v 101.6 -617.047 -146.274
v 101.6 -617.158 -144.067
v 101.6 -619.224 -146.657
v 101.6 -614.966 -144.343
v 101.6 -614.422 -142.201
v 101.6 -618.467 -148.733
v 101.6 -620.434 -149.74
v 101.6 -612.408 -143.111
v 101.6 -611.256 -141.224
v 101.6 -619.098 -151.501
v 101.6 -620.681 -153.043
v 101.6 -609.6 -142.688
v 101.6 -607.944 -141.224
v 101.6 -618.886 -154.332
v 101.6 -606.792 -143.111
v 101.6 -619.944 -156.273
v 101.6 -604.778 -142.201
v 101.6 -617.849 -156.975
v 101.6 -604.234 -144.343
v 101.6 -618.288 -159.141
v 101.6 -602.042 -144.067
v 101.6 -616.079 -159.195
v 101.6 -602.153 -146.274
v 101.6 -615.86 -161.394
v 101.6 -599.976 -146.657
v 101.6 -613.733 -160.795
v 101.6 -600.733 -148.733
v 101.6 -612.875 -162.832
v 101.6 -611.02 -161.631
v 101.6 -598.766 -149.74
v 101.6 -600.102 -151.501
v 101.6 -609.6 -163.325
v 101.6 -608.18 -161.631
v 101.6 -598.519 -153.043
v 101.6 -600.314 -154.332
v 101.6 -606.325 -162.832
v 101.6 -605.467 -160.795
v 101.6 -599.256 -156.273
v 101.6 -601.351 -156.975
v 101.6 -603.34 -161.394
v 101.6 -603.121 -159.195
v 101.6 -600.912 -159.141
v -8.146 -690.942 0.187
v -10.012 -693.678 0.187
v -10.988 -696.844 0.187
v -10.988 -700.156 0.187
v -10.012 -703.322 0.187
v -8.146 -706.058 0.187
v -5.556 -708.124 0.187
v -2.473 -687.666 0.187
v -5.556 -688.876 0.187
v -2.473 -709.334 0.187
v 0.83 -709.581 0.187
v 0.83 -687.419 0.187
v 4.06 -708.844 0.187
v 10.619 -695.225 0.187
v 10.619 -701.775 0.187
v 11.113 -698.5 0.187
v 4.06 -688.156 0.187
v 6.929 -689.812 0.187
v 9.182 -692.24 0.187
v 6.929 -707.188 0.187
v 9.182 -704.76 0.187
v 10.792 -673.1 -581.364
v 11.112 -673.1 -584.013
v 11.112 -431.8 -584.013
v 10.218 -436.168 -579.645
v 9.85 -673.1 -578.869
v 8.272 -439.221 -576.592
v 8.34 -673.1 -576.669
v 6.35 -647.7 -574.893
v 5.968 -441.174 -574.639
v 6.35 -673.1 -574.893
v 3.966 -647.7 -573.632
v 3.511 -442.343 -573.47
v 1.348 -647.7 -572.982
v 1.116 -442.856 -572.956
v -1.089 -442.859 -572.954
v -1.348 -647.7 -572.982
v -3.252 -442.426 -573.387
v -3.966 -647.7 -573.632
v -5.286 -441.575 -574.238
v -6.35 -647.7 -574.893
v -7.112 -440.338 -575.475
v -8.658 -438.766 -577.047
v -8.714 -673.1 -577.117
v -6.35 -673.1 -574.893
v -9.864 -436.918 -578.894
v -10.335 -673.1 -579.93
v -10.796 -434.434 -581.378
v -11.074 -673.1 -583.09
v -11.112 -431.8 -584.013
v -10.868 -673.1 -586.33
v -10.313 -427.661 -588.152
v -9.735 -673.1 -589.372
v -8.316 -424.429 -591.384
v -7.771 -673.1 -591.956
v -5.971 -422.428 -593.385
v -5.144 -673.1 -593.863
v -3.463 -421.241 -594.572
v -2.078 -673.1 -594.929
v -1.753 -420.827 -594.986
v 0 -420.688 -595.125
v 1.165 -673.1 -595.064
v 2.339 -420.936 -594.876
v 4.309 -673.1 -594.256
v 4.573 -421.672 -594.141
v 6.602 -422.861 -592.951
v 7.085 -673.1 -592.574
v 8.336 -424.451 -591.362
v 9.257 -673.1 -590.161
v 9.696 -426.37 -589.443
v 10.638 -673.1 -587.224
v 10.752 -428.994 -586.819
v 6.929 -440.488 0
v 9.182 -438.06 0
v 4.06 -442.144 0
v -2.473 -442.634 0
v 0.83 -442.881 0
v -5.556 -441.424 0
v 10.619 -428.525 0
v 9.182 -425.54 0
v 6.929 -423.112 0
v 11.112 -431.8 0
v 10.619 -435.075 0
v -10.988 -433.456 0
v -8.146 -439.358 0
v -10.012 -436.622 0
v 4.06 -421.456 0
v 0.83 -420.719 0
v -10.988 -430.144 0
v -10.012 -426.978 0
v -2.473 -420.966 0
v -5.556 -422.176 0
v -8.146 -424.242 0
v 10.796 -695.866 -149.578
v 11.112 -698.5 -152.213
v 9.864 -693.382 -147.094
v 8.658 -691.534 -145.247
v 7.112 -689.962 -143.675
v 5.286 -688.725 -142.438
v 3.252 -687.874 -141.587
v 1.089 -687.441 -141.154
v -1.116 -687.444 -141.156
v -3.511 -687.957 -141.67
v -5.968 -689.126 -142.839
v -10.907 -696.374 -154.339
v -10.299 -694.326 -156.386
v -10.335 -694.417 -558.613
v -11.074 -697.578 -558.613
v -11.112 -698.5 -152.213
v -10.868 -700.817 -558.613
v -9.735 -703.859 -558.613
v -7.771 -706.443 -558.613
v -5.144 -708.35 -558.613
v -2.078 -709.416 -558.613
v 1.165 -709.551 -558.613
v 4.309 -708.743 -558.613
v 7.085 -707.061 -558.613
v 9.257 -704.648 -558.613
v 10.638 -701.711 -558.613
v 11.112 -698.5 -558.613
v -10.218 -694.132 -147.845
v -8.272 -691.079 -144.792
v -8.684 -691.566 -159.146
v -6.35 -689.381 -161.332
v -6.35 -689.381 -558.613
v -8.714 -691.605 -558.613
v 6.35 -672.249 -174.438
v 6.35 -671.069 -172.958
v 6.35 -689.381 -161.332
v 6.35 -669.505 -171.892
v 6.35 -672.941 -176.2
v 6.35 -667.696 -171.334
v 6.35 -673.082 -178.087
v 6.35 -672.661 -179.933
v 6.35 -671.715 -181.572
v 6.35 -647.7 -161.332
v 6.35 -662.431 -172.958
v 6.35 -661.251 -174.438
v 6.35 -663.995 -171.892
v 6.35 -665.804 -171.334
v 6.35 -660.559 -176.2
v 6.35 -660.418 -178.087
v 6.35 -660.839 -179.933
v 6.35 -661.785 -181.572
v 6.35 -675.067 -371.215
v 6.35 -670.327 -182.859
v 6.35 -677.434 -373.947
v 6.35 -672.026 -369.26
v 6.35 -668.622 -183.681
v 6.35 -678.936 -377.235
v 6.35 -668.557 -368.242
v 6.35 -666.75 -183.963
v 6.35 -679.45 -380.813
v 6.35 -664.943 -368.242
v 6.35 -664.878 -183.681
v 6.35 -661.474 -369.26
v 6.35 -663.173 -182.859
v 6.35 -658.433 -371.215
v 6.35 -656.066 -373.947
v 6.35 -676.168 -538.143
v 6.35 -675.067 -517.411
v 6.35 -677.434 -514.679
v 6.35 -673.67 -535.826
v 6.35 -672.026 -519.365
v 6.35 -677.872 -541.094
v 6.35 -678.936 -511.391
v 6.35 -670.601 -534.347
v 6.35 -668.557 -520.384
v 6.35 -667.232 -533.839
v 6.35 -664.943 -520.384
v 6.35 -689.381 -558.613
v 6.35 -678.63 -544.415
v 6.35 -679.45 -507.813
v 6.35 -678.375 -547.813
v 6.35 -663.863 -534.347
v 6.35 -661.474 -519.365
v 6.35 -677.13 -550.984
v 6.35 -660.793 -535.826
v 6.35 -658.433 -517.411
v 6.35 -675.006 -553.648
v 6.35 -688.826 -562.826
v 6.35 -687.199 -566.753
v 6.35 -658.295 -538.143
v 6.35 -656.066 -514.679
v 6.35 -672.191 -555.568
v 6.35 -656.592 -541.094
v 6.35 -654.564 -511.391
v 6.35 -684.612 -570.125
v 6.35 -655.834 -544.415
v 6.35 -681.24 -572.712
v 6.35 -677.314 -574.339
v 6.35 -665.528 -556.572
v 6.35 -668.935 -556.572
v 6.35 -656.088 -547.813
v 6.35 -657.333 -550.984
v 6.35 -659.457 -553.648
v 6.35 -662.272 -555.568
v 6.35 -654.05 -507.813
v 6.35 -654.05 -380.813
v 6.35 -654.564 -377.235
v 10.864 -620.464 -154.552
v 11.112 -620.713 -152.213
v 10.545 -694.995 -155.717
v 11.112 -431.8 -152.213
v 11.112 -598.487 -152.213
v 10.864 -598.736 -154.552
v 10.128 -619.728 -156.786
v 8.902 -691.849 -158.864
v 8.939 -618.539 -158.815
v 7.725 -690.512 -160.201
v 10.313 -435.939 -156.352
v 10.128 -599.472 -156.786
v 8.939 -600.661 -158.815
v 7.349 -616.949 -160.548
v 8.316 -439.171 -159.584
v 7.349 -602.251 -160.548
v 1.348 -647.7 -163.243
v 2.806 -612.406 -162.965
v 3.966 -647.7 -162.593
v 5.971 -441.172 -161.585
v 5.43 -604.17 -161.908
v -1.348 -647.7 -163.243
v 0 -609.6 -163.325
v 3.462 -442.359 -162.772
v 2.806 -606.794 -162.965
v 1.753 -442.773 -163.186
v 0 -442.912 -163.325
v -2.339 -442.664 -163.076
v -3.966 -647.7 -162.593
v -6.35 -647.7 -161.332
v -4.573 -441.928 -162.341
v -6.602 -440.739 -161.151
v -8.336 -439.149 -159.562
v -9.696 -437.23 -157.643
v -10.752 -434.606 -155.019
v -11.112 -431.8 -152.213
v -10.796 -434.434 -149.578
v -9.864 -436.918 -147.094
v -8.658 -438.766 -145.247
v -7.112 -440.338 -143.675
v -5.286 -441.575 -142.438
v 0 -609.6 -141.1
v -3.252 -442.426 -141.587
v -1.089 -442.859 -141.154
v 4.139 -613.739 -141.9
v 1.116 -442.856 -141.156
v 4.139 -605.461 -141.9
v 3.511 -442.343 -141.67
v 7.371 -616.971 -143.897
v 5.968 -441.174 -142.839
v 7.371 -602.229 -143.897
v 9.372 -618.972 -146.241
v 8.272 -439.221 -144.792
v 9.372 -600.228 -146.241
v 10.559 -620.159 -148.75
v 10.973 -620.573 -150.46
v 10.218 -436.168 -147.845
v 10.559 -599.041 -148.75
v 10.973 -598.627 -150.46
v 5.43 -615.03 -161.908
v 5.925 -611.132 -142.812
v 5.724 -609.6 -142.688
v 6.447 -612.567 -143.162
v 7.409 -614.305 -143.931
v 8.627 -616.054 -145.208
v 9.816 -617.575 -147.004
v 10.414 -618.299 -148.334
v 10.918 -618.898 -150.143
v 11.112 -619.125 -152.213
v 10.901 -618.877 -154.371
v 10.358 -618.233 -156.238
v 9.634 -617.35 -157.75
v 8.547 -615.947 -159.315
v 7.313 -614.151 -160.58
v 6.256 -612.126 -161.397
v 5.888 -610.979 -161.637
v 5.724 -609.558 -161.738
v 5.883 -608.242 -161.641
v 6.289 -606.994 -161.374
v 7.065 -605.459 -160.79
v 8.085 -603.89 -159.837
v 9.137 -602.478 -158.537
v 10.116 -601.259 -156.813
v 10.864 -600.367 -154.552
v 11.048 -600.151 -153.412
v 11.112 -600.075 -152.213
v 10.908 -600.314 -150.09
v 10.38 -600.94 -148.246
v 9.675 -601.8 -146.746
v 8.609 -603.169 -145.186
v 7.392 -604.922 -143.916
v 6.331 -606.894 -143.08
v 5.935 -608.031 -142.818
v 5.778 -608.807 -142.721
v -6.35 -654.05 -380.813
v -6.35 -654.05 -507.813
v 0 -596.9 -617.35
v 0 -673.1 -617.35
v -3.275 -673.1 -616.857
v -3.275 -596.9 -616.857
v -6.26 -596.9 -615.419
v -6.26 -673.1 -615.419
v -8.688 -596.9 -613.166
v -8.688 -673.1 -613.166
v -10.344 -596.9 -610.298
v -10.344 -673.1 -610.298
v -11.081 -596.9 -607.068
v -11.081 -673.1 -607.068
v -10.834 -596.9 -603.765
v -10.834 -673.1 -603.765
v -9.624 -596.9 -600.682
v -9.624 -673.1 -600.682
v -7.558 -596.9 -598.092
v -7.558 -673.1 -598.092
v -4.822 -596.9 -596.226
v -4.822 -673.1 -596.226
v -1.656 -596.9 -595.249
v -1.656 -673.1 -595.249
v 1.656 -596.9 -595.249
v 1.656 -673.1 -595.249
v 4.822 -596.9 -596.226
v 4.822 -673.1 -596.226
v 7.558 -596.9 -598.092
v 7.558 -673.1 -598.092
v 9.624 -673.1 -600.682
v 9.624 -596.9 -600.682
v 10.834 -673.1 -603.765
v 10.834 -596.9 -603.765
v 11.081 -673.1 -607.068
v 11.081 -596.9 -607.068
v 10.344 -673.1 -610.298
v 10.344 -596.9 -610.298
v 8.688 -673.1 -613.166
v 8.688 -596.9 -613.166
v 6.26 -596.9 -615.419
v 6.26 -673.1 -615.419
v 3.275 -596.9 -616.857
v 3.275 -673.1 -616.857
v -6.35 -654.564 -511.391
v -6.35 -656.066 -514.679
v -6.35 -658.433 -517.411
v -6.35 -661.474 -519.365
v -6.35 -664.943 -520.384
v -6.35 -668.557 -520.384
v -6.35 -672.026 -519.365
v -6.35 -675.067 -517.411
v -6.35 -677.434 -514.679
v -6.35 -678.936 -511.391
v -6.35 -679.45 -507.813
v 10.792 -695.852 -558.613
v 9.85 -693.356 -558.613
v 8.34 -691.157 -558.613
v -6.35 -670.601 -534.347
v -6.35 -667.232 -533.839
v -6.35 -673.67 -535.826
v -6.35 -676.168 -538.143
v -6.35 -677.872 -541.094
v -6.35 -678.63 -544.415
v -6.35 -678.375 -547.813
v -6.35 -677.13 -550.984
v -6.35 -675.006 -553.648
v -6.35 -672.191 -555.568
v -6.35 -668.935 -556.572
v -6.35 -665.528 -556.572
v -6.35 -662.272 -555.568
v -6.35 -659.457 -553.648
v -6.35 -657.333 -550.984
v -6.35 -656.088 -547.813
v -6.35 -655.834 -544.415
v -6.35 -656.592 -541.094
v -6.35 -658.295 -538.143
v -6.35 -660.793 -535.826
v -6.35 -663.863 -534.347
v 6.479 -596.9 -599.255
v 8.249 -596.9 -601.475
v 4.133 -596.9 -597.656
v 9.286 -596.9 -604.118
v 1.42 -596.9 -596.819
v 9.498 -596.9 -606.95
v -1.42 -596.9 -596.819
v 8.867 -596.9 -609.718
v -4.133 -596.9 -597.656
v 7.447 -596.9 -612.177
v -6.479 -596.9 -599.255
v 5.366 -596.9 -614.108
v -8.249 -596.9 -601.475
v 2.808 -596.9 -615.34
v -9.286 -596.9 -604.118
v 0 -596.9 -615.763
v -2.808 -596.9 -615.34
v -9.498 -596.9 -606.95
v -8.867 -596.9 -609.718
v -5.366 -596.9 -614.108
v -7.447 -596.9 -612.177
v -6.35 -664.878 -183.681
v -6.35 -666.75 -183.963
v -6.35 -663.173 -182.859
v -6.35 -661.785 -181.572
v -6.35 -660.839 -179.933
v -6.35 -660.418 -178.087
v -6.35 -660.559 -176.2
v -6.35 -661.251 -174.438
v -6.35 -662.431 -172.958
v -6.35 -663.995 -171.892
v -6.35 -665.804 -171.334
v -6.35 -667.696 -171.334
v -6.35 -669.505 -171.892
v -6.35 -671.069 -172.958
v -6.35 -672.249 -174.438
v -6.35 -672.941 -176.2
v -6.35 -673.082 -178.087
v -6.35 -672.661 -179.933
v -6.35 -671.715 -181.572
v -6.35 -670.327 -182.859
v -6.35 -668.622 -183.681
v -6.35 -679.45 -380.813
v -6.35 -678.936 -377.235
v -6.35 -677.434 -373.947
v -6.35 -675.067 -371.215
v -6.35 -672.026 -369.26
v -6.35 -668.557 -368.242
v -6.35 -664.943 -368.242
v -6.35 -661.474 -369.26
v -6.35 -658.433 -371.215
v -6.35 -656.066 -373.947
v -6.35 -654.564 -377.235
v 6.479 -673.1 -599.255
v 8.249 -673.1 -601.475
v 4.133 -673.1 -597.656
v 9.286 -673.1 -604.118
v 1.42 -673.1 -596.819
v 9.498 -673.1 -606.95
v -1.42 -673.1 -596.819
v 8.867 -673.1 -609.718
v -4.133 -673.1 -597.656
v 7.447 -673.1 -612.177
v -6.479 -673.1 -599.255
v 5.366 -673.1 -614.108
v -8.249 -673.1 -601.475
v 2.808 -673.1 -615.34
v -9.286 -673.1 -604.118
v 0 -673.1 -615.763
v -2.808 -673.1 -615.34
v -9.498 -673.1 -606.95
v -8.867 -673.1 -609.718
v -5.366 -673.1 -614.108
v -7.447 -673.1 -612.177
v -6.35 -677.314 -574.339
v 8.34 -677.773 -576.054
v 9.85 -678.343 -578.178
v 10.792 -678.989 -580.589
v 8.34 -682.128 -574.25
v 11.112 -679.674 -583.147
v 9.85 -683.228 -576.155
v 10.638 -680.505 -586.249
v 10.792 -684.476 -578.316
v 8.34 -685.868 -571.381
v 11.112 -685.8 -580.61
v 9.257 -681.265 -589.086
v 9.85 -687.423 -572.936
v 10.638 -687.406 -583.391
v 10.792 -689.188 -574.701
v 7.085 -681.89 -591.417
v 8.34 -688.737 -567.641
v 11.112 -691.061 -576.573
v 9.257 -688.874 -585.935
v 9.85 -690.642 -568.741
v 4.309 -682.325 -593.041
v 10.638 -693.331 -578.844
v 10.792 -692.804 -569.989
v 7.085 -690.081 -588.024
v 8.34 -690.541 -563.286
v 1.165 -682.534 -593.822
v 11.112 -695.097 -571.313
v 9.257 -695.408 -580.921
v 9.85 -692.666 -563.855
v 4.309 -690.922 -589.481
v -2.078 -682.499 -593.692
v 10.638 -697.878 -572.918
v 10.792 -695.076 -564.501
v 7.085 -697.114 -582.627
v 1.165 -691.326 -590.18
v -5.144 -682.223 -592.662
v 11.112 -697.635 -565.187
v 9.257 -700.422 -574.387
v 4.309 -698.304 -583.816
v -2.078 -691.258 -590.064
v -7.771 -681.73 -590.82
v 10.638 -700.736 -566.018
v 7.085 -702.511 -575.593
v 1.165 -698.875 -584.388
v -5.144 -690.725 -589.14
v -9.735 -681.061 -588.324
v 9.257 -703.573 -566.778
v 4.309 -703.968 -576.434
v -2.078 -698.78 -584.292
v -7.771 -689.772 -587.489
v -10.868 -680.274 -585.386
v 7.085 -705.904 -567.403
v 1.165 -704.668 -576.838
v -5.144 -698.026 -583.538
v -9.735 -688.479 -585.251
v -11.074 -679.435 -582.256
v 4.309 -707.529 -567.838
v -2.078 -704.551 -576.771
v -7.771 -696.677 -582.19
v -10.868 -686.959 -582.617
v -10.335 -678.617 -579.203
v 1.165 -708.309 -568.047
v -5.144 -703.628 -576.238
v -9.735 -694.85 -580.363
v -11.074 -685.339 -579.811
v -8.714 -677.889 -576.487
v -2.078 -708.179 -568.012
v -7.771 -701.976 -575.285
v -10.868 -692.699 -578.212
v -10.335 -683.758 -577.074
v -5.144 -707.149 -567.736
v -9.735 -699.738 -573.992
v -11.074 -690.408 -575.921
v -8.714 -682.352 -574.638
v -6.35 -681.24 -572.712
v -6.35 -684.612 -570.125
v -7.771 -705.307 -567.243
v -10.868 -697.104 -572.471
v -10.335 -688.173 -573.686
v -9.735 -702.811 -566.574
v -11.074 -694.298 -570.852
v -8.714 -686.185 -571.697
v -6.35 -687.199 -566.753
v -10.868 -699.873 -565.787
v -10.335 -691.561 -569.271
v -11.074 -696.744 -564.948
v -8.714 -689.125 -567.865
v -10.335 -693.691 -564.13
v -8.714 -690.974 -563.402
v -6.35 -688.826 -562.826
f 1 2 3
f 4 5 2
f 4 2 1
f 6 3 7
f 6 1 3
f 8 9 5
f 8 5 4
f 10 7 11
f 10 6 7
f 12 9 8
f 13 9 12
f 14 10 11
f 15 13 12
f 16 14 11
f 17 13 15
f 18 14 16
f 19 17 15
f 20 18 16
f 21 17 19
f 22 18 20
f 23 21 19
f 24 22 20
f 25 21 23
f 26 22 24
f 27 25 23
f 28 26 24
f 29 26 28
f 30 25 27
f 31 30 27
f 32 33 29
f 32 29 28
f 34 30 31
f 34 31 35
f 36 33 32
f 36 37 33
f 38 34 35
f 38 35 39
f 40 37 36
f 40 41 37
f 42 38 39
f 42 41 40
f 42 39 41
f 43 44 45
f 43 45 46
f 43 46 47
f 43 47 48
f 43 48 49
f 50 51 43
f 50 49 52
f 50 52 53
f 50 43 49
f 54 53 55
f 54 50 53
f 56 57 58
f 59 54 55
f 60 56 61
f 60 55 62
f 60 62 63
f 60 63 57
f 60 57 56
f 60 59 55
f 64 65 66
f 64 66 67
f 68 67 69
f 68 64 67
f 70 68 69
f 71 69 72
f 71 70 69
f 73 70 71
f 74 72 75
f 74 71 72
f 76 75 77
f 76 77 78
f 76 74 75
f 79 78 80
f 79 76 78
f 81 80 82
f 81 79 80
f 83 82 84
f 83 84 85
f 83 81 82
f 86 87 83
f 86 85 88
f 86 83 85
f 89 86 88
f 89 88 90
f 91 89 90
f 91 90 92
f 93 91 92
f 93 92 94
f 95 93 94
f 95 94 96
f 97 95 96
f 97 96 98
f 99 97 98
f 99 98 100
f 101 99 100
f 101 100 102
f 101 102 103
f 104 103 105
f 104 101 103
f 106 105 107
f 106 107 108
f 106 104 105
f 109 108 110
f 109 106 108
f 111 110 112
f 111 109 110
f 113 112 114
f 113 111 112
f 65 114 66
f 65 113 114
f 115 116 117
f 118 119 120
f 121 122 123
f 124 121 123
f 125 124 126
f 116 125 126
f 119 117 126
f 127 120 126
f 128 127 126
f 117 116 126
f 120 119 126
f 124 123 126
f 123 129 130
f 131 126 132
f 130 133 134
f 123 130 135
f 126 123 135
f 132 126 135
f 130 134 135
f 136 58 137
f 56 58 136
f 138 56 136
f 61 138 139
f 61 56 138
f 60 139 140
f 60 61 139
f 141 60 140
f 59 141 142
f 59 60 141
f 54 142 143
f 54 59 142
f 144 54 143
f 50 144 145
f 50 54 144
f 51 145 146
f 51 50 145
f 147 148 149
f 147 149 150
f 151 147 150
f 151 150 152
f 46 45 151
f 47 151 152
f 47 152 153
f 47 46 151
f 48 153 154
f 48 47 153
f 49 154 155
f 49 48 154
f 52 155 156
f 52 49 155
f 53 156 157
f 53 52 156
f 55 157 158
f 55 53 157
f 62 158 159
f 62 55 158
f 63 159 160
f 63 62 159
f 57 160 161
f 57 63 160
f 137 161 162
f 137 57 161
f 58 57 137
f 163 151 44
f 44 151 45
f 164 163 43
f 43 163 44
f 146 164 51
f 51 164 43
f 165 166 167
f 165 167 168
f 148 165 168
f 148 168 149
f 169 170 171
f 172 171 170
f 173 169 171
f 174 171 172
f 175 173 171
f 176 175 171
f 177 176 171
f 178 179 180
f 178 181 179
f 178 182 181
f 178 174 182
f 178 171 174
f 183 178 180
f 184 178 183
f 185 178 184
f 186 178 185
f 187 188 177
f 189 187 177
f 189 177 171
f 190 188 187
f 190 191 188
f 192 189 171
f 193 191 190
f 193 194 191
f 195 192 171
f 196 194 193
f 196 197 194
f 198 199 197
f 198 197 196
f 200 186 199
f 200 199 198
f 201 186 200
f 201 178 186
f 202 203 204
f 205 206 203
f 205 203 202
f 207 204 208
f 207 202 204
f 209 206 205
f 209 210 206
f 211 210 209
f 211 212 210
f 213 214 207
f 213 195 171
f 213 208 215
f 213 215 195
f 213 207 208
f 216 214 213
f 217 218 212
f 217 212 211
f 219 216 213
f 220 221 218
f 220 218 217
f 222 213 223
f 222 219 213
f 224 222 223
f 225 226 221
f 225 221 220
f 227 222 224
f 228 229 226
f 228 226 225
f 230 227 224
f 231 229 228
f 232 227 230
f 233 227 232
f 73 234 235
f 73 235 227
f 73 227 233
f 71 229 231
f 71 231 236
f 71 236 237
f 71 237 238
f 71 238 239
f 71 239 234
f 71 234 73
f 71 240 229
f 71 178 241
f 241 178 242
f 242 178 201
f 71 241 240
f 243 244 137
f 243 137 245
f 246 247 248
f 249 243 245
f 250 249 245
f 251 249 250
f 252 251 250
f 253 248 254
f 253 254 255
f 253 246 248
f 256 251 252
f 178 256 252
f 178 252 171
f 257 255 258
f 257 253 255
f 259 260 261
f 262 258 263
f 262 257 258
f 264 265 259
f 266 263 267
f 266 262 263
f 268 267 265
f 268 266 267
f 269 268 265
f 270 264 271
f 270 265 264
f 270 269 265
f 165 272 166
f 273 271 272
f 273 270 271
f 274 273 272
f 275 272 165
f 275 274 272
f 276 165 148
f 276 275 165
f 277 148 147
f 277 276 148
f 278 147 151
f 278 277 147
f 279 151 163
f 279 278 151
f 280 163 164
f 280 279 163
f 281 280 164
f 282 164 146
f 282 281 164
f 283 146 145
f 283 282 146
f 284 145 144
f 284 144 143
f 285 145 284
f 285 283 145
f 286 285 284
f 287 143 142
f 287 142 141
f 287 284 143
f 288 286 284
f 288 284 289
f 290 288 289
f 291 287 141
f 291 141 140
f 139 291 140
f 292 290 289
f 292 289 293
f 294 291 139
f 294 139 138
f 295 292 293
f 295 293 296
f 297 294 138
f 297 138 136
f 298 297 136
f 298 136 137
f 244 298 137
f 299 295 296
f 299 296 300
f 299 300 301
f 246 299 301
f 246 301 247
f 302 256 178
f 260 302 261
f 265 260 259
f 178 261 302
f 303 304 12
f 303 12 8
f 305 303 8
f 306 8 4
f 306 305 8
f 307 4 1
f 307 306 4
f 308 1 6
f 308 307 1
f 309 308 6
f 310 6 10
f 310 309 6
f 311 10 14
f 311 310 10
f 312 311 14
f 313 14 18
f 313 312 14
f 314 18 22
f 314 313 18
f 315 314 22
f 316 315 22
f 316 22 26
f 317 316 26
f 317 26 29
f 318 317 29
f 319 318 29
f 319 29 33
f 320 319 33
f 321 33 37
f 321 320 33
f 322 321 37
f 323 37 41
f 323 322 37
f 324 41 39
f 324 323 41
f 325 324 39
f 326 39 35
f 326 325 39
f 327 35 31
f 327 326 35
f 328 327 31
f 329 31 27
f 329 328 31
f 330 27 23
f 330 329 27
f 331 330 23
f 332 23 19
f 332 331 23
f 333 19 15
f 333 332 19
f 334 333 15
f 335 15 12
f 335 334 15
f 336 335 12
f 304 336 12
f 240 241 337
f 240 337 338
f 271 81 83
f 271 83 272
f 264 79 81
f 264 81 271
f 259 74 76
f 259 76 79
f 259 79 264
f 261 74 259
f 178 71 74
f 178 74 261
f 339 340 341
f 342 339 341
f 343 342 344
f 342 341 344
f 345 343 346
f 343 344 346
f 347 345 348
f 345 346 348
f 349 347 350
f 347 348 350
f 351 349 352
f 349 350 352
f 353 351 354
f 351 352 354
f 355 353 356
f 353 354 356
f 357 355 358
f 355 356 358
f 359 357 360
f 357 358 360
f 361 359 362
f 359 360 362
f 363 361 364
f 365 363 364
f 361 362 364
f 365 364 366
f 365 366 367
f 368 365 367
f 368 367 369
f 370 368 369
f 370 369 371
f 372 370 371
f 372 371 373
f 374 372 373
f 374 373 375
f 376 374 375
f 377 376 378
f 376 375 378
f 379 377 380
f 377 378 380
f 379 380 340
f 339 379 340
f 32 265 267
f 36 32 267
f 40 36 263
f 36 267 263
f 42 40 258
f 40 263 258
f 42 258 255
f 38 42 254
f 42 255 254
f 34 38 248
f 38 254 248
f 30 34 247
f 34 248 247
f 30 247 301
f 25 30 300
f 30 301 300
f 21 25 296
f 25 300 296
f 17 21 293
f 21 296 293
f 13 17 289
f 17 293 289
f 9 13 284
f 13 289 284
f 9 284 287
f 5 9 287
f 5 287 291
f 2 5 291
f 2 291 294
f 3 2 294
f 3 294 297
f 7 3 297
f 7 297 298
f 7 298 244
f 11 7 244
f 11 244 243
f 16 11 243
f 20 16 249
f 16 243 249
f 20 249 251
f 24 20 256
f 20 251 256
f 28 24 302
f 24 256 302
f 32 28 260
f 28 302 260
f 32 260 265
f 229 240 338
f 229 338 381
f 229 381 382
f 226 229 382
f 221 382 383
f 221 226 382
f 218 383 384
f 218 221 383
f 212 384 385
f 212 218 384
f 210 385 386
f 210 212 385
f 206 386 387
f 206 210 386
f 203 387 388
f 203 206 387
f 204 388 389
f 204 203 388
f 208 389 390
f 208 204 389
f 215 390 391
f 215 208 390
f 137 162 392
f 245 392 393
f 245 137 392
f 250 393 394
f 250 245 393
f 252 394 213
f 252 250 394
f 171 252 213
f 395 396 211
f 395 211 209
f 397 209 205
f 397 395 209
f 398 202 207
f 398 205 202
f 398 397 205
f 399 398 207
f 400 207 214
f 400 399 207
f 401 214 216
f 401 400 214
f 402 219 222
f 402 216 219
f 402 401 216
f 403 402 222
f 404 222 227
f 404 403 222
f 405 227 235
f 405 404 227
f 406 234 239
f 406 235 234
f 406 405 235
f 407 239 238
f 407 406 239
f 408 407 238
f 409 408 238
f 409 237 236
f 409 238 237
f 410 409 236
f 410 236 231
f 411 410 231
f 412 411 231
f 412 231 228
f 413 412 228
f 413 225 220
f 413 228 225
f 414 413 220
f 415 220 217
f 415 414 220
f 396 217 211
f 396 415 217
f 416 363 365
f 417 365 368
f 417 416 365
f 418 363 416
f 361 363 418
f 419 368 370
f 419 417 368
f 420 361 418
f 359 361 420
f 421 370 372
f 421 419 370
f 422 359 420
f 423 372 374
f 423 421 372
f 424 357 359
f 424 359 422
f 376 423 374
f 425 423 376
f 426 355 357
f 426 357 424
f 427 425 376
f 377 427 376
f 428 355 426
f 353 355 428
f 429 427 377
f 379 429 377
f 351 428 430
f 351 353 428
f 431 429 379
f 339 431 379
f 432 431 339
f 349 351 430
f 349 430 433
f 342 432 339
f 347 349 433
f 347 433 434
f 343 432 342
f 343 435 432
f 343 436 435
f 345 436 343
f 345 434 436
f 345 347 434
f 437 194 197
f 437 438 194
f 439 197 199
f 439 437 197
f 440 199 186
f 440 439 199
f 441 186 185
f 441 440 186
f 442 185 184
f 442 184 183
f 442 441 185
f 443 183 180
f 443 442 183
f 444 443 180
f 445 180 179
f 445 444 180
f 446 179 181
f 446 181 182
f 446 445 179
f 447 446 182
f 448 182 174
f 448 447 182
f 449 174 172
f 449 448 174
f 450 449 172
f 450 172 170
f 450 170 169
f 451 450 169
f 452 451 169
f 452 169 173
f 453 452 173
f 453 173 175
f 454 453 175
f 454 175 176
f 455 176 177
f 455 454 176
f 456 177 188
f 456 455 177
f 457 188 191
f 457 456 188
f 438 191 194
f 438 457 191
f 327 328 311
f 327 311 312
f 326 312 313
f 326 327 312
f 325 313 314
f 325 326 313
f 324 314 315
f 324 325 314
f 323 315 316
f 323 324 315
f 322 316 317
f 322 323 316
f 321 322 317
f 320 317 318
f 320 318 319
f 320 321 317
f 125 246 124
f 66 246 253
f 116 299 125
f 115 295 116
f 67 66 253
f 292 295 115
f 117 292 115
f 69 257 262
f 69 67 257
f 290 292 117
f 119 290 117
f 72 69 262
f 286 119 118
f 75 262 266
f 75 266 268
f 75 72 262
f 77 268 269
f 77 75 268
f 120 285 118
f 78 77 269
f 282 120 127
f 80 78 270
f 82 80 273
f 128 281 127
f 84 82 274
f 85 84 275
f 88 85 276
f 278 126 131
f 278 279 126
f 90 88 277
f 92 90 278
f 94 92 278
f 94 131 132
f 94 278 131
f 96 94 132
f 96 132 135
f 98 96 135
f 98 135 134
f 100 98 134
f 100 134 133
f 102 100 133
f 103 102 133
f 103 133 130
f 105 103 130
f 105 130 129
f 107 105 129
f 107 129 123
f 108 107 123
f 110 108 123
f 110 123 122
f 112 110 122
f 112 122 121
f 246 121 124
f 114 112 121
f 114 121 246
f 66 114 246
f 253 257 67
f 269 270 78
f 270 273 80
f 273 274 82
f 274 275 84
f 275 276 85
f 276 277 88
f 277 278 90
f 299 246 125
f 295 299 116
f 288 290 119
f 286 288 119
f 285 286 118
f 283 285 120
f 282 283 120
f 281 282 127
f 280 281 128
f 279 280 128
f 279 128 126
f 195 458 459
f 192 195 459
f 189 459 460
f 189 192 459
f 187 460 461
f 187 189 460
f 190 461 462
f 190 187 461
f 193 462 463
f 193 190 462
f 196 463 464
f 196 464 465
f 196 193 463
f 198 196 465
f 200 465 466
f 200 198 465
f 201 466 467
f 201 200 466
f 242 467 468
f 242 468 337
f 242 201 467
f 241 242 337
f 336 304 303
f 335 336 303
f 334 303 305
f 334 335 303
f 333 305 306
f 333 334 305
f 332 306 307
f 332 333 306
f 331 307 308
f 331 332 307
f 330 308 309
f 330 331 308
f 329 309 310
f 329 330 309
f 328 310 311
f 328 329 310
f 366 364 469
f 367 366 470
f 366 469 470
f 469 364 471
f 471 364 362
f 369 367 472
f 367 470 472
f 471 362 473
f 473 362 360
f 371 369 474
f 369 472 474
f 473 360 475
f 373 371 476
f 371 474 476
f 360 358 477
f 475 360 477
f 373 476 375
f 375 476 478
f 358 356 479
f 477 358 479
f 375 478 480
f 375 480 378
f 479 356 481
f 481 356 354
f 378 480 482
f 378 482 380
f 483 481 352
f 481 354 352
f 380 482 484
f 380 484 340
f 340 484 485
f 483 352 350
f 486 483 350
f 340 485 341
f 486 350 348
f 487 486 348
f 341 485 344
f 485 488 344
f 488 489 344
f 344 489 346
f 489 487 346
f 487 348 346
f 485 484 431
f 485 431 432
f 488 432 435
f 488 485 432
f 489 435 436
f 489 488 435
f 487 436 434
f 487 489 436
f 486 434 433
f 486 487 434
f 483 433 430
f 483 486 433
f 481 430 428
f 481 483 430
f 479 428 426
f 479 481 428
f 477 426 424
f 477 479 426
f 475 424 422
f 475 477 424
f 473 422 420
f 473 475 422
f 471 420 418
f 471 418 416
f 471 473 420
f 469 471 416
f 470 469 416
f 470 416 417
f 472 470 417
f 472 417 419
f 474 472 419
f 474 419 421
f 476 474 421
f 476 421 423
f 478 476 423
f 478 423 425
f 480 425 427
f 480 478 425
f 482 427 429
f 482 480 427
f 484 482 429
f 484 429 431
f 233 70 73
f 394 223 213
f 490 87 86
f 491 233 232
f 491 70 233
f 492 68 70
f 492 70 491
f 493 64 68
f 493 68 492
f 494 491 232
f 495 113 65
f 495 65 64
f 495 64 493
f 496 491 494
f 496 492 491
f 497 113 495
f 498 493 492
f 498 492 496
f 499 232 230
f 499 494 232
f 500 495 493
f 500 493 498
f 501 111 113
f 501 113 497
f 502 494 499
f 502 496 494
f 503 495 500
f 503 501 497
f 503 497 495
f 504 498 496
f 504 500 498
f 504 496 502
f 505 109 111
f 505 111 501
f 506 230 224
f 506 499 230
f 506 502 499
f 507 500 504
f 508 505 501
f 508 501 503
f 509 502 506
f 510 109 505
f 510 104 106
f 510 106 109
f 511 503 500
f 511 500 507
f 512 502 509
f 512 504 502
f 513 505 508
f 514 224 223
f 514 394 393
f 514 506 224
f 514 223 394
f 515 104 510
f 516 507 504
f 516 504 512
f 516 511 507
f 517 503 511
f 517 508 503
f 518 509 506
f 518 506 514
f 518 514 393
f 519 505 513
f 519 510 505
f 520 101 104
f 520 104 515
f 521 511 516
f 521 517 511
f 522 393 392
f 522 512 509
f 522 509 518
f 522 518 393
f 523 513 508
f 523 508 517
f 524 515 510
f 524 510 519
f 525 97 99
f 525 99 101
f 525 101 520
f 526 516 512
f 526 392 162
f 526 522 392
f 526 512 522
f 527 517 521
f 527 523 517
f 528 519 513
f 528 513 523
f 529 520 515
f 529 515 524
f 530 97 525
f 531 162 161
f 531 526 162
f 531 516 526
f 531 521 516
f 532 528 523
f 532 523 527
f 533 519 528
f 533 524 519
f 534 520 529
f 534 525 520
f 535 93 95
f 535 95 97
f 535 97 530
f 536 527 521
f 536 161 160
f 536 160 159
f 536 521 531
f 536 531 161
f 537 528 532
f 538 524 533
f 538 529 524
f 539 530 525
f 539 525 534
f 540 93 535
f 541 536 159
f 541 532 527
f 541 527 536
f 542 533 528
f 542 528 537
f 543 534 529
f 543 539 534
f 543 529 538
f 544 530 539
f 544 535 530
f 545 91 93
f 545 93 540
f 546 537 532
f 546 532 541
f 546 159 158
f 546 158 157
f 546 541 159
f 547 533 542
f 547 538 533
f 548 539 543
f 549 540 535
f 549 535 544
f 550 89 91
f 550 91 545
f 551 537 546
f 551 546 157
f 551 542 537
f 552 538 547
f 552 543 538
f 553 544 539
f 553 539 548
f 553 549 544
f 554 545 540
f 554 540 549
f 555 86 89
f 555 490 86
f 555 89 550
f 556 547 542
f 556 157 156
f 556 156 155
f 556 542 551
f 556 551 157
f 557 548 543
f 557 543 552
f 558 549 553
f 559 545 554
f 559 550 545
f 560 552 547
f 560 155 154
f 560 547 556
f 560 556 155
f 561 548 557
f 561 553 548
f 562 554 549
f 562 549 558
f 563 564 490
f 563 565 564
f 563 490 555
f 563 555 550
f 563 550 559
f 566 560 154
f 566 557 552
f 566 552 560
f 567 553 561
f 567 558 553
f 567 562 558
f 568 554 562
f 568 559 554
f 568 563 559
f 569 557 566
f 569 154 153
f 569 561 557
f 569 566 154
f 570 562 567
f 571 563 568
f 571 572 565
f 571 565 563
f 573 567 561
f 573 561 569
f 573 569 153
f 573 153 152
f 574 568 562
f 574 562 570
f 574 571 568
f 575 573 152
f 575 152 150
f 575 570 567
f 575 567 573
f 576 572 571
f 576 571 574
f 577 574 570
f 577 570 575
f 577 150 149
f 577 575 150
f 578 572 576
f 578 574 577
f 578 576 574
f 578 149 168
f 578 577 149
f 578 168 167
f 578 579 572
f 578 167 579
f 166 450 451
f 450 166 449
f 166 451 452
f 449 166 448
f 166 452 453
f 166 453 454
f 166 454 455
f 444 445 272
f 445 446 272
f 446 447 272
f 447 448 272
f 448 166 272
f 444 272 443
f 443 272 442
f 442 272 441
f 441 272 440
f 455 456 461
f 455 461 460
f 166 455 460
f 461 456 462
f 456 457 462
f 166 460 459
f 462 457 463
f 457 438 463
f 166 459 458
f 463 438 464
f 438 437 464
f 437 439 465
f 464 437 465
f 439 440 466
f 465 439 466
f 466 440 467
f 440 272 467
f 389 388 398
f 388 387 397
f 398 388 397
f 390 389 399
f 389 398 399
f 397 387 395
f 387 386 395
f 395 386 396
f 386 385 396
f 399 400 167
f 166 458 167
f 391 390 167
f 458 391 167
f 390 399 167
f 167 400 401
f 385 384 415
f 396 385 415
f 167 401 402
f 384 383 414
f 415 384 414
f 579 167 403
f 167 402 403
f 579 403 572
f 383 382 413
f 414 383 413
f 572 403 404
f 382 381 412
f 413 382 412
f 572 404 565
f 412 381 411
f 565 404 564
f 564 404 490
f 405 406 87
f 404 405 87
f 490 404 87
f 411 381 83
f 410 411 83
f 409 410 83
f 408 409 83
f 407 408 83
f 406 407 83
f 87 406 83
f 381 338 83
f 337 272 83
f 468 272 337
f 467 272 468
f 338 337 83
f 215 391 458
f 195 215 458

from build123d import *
from build123d.topology import SkipClean

# Parameters (mm, degrees)
SKETCH3_R               = 11.1125
SKETCH3_8_R             = 11.1125
SKETCH11_R              = 6.35
BOSS_EXTRUDE2_DEPTH     = 6.35
SKETCH12_R              = 11.1125
SKETCH12_R_2            = 9.525
BOSS_EXTRUDE3_DEPTH     = 101.6
SKETCH13_R              = 11.1125
SKETCH13_R_2            = 9.525
BOSS_EXTRUDE4_DEPTH     = 76.2
CUT_EXTRUDE2_DEPTH      = 947.041134319
CUT_EXTRUDE2_DEPTH_BACK = 947.041134319
SKETCH14_R              = 11.43


with BuildPart() as part:
    # Sweep1: sweep along a path in Sketch1
    with BuildLine(Plane(origin=(0, 0, 0), x_dir=(0, 0, -1), z_dir=(1, 0, 0))) as sweep1_path:
        Line((0, -431.8), (152.212779539, -431.8))
        Line((152.212779539, -431.8), (584.012779539, -431.8))
        Line((584.012779539, -431.8), (584.012779539, -673.1))
        ThreePointArc((584.012779539, -673.1), (576.573291781, -691.060512242), (558.612779539, -698.5))
        Line((558.612779539, -698.5), (152.212779539, -698.5))
        Line((152.212779539, -698.5), (-0.187220461, -698.5))
    # Sketch3 → Sweep1 (sweep)
    with BuildSketch(Plane.XY):
        with Locations((0, -698.5)):
            Circle(SKETCH3_R)
    sweep(path=sweep1_path.line, transition=Transition.RIGHT)

    # Sweep2: sweep along a path in Sketch1<23>
    with BuildLine(Plane(origin=(0, 0, 0), x_dir=(0, 0, -1), z_dir=(1, 0, 0))) as sweep2_path:
        Line((-0.187220461, -698.5), (152.212779539, -698.5))
        Line((152.212779539, -698.5), (152.212779539, -431.8))
    # Sketch3<8> → Sweep2 (sweep)
    with BuildSketch(Plane.XY):
        with Locations((0, -698.5)):
            Circle(SKETCH3_8_R)
    sweep(path=sweep2_path.line, transition=Transition.RIGHT)

    # Sketch11 → Boss-Extrude2 (add, symmetric)
    with BuildSketch(Plane(origin=(0, 0, 0), x_dir=(0, 0, -1), z_dir=(1, 0, 0))):
        with BuildLine():
            Line((584.012779539, -673.1), (584.012779539, -647.7))
            Line((584.012779539, -647.7), (152.212779539, -647.7))
            Line((152.212779539, -647.7), (152.212779539, -698.5))
            Line((152.212779539, -698.5), (558.612779539, -698.5))
            ThreePointArc((558.612779539, -698.5), (576.573291781, -691.060512242), (584.012779539, -673.1))
        make_face()
        with BuildLine():
            ThreePointArc((380.812779539, -679.45), (368.112779539, -666.75), (380.812779539, -654.05))
            Line((380.812779539, -654.05), (507.812779539, -654.05))
            ThreePointArc((507.812779539, -654.05), (520.512779539, -666.75), (507.812779539, -679.45))
            Line((507.812779539, -679.45), (380.812779539, -679.45))
        make_face(mode=Mode.SUBTRACT)
        with Locations((177.612779539, -666.75)):
            Circle(SKETCH11_R, mode=Mode.SUBTRACT)
    extrude(amount=BOSS_EXTRUDE2_DEPTH, both=True)

    # Sketch12 → Boss-Extrude3 (add)
    with SkipClean():  # the faces are left unmerged after this step: merging them gives an invalid solid
        with BuildSketch(Plane(origin=(0, 0, 0), x_dir=(0, 0, -1), z_dir=(1, 0, 0))):
            with Locations((152.212779539, -609.6)):
                Circle(SKETCH12_R)
            with Locations((152.212779539, -609.6)):
                Circle(SKETCH12_R_2, mode=Mode.SUBTRACT)
        extrude(amount=BOSS_EXTRUDE3_DEPTH)

    # Sketch14 → Cut-Extrude2 (cut, two sides: drawn at the far end of the back side and taken through both)
    with SkipClean():  # the faces are left unmerged after this step: merging them gives an invalid solid
        with BuildSketch(Plane(origin=(0, 0, 0), x_dir=(0, 0, -1), z_dir=(1, 0, 0)).offset(-CUT_EXTRUDE2_DEPTH_BACK)):
            with Locations((545.269475056, -667.231739767)):
                Circle(SKETCH14_R)
        extrude(amount=CUT_EXTRUDE2_DEPTH + CUT_EXTRUDE2_DEPTH_BACK, mode=Mode.SUBTRACT)


with BuildPart() as body_2:
    # Sketch13 → Boss-Extrude4 (new body)
    with BuildSketch(Plane(origin=(0, -673.1, 0), x_dir=(1, 0, 0), z_dir=(0, 1, 0))):
        with Locations((0, 606.237779539)):
            Circle(SKETCH13_R)
        with Locations((0, 606.237779539)):
            Circle(SKETCH13_R_2, mode=Mode.SUBTRACT)
    extrude(amount=BOSS_EXTRUDE4_DEPTH)


solid = Compound([part.part, body_2.part])
